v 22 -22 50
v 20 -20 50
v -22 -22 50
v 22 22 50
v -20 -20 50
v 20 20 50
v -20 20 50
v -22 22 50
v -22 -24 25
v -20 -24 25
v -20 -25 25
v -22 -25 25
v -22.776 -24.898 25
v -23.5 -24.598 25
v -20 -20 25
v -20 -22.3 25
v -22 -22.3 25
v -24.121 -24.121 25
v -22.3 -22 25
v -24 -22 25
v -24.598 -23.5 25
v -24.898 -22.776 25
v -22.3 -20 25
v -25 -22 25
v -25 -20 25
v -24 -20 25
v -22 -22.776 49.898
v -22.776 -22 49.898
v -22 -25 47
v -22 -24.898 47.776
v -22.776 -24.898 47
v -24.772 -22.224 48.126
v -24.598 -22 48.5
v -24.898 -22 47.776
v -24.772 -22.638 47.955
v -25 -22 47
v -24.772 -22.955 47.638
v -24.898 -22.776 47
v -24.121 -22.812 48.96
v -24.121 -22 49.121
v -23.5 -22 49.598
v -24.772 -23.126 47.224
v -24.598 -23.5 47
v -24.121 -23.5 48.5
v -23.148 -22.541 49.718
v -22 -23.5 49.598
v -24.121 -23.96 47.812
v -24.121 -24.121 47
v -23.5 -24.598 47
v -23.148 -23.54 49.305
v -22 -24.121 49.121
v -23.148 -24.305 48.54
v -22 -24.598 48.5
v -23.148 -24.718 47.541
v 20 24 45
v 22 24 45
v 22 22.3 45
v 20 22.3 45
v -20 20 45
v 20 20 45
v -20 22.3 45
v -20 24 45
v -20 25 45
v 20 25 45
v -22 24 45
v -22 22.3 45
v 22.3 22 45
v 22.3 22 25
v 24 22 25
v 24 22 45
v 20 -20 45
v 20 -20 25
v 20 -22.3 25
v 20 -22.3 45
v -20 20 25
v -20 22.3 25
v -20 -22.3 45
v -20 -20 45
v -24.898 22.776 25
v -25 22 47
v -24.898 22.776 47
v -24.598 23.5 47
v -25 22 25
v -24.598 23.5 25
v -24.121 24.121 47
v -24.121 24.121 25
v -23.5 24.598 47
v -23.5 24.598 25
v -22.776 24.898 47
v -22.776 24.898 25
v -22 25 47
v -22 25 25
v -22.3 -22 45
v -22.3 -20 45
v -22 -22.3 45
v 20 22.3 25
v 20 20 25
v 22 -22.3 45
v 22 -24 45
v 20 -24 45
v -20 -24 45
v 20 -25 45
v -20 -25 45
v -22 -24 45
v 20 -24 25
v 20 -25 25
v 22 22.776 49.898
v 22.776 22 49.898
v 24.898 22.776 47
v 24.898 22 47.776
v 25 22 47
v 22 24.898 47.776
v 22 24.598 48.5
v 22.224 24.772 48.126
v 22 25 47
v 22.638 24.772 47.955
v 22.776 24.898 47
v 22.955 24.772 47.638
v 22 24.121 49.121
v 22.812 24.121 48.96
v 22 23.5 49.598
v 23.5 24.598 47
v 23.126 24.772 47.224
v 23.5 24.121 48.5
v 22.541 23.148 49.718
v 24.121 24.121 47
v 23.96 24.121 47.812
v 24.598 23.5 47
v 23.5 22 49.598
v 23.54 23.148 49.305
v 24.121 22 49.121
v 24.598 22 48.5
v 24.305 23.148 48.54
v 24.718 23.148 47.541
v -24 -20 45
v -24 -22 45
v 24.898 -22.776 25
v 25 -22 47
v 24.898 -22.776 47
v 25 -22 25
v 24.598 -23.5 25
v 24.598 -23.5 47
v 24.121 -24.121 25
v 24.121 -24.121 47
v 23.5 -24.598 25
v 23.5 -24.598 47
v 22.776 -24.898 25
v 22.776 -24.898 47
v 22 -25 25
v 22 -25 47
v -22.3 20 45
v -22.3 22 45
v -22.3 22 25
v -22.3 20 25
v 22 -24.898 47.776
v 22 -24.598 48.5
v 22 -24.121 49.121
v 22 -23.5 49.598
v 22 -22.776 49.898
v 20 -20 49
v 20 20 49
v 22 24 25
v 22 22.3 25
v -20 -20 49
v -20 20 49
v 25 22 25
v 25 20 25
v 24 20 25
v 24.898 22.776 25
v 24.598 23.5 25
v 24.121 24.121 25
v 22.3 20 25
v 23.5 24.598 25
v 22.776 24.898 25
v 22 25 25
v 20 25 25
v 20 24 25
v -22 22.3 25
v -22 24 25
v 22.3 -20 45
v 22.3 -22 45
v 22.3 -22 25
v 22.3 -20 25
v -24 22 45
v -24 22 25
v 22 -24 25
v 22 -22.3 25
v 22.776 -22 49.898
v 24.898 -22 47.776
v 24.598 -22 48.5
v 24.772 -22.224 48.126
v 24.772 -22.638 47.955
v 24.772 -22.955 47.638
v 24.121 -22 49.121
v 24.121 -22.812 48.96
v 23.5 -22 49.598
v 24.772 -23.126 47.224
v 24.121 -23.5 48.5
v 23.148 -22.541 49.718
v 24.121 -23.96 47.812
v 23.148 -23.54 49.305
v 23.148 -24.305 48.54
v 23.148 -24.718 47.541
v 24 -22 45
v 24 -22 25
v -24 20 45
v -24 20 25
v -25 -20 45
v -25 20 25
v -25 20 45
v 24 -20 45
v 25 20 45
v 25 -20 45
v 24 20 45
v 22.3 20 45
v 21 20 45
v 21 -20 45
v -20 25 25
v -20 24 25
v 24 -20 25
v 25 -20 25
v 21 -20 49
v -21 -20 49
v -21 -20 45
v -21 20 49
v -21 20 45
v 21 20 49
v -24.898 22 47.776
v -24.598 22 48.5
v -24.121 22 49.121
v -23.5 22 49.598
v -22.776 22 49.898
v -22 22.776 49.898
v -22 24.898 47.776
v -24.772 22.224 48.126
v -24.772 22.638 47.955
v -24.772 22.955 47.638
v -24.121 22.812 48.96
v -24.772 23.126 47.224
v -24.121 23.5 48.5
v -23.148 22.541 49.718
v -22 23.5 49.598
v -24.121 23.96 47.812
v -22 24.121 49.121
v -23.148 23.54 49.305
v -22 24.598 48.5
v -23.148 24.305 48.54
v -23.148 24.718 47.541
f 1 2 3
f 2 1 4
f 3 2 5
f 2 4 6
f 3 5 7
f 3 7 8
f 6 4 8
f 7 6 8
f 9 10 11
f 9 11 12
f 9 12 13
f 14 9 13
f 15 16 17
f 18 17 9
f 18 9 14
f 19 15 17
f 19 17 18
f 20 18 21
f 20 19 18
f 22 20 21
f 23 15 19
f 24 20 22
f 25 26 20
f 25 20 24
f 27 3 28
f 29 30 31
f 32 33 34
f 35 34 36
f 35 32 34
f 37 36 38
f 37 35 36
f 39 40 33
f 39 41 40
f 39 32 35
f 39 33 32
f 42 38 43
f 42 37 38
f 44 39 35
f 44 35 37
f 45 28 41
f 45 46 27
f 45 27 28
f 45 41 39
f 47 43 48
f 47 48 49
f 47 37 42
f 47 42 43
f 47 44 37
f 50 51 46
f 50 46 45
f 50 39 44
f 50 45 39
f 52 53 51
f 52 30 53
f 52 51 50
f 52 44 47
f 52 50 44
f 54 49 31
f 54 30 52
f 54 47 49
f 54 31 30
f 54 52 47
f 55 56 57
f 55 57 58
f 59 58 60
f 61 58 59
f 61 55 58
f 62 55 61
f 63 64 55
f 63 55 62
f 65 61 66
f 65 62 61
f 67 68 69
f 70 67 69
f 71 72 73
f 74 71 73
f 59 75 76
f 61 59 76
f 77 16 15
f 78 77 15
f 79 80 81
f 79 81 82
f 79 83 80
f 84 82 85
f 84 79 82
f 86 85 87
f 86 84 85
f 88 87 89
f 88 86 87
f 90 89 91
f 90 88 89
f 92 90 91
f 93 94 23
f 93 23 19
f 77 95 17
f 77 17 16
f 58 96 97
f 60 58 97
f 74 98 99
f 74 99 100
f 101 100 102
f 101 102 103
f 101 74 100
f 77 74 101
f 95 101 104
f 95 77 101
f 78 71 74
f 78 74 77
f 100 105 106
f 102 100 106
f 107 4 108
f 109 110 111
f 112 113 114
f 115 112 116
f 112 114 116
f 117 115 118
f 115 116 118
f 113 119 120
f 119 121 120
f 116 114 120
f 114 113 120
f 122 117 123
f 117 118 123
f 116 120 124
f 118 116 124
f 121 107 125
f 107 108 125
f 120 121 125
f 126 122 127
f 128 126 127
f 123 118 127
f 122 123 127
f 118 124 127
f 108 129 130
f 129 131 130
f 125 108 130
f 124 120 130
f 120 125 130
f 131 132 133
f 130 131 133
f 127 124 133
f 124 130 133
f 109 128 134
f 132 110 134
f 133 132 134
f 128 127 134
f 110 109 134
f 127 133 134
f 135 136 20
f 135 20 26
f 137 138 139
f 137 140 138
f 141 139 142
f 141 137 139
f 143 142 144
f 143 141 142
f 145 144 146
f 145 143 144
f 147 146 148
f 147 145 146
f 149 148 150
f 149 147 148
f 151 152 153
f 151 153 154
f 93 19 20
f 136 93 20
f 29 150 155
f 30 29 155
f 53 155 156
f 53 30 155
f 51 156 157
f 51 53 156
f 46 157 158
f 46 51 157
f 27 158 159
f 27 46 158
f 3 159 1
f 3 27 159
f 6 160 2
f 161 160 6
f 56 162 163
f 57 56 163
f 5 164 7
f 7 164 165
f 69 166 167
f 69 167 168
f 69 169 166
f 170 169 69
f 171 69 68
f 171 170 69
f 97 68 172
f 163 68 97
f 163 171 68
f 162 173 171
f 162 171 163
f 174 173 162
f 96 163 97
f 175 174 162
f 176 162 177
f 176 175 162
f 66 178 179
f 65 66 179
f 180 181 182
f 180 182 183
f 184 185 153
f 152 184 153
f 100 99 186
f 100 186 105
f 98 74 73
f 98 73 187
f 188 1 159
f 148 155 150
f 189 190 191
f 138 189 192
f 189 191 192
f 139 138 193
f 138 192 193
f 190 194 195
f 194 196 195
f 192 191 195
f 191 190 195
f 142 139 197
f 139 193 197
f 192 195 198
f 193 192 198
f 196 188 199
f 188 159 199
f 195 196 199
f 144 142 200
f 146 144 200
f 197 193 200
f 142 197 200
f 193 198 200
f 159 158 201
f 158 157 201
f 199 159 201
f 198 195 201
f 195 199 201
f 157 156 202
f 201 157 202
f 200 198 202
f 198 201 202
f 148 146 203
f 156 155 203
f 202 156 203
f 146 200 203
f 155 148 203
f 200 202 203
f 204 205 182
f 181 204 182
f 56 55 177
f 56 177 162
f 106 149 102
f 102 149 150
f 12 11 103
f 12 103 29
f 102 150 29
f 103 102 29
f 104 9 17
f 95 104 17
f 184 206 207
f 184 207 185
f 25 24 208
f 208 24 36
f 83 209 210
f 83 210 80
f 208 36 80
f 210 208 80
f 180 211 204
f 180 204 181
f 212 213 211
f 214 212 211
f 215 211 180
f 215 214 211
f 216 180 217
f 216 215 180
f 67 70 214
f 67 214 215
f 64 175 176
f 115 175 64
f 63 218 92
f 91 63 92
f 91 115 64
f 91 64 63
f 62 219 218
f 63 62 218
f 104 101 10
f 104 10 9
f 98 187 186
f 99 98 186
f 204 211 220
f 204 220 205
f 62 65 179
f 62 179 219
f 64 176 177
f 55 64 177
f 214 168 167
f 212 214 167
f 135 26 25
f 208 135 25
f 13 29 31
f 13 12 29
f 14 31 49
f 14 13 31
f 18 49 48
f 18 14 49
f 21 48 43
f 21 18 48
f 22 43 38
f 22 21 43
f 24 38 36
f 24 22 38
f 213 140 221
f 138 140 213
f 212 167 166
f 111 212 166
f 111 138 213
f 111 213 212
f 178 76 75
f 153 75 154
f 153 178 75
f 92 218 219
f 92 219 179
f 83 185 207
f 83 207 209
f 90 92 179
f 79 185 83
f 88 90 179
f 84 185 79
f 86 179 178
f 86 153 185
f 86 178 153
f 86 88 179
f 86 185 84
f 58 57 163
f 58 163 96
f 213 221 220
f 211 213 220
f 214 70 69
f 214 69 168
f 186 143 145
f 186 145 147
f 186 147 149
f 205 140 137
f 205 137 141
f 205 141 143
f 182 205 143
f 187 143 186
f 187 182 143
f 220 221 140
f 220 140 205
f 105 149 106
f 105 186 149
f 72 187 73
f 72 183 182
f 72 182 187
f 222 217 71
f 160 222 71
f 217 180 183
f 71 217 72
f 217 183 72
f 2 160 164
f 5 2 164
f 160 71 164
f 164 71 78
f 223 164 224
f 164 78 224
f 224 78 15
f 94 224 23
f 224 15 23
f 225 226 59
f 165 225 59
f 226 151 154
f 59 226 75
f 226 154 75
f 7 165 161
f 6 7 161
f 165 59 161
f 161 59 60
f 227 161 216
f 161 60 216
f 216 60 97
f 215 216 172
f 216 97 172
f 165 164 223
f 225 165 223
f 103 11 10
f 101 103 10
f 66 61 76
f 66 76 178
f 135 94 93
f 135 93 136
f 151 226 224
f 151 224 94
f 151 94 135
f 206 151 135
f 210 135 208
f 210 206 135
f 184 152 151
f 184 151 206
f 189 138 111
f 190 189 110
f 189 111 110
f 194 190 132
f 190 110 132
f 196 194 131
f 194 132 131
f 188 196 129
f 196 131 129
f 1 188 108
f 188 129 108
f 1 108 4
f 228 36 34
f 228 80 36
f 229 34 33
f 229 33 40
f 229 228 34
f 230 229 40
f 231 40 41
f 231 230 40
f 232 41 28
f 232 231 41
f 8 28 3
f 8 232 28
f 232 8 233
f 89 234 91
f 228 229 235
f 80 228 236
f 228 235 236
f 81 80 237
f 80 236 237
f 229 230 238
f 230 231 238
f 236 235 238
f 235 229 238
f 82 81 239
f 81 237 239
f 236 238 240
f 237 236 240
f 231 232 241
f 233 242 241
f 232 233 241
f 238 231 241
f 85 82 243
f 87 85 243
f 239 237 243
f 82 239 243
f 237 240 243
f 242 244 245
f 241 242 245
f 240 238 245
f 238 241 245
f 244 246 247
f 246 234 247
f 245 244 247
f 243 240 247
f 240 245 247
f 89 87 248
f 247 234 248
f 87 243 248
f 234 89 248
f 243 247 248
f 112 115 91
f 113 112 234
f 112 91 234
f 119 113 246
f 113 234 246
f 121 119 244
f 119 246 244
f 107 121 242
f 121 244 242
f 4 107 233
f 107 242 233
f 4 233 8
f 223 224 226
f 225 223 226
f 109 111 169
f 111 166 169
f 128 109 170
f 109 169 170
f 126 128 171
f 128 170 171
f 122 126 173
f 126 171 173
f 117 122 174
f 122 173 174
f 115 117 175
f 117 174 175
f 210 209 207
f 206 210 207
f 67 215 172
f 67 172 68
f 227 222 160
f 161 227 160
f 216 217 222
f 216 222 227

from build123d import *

# Parameters (mm, degrees)
SKETCH011_W             = 50
SKETCH011_H             = 50
PAD001_DEPTH            = 25
FILLET001_R             = 3
POCKET004_DEPTH         = 20
SKETCH013_W             = 42
SKETCH013_H             = 40
POCKET003_DEPTH         = 4
SKETCH010_W             = 40
SKETCH010_H             = 40
POCKET005_DEPTH         = 1
BODY001_PLACEMENT_ANGLE = 180


with BuildPart() as part:
    # Sketch011 → Pad001 (new body)
    with BuildSketch(Plane.XY):
        Rectangle(SKETCH011_W, SKETCH011_H)
    extrude(amount=PAD001_DEPTH)

    # Fillet001
    fillet001_edges = [part.edges().sort_by_distance(p)[0] for p in [
        (0, -25, 0),
        (-25, 0, 0),
        (0, 25, 0),
        (25, 0, 0),
        (-25, -25, 12.5),
        (25, 25, 12.5),
        (-25, 25, 12.5),
        (25, -25, 12.5),
    ]]
    fillet(fillet001_edges, radius=FILLET001_R)

    # Sketch012 (on Face2 of Fillet001) → Pocket004 (cut)
    with BuildSketch(Plane.XY.offset(25)):
        Polygon((-20, 25), (-20, 24), (-22, 24), (-22, 22.3), (-20, 22.3), (-20, 20), (-22.3, 20), (-22.3, 22), (-24, 22), (-24, 20), (-25, 20), (-25, -20), (-24, -20), (-24, -22), (-22.3, -22), (-22.3, -20), (-20, -20), (-20, -22.3), (-22, -22.3), (-22, -24), (-20, -24), (-20, -25), (20, -25), (20, -24), (22, -24), (22, -22.3), (20, -22.3), (20, -20), (22.3, -20), (22.3, -22), (24, -22), (24, -20), (25, -20), (25, 20), (24, 20), (24, 22), (22.3, 22), (22.3, 20), (20, 20), (20, 22.3), (22, 22.3), (22, 24), (20, 24), (20, 25), align=None)
    extrude(amount=-POCKET004_DEPTH, mode=Mode.SUBTRACT)

    # Sketch013 (on Face7 of Pocket004) → Pocket003 (cut)
    with BuildSketch(Plane.XY.offset(5)):
        Rectangle(SKETCH013_W, SKETCH013_H)
    extrude(amount=-POCKET003_DEPTH, mode=Mode.SUBTRACT)

    # Sketch010 (on Face47 of Pocket003) → Pocket005 (cut)
    with BuildSketch(Plane.XY.offset(1)):
        Rectangle(SKETCH010_W, SKETCH010_H)
    extrude(amount=-POCKET005_DEPTH, mode=Mode.SUBTRACT)


with BuildPart() as part_1:
    # Body001 placement: moved
    add(part.part.moved(Location((0, 0, 50))).rotate(Axis((0, 0, 50), (0, 1, 0)), BODY001_PLACEMENT_ANGLE))


solid = part_1.part
